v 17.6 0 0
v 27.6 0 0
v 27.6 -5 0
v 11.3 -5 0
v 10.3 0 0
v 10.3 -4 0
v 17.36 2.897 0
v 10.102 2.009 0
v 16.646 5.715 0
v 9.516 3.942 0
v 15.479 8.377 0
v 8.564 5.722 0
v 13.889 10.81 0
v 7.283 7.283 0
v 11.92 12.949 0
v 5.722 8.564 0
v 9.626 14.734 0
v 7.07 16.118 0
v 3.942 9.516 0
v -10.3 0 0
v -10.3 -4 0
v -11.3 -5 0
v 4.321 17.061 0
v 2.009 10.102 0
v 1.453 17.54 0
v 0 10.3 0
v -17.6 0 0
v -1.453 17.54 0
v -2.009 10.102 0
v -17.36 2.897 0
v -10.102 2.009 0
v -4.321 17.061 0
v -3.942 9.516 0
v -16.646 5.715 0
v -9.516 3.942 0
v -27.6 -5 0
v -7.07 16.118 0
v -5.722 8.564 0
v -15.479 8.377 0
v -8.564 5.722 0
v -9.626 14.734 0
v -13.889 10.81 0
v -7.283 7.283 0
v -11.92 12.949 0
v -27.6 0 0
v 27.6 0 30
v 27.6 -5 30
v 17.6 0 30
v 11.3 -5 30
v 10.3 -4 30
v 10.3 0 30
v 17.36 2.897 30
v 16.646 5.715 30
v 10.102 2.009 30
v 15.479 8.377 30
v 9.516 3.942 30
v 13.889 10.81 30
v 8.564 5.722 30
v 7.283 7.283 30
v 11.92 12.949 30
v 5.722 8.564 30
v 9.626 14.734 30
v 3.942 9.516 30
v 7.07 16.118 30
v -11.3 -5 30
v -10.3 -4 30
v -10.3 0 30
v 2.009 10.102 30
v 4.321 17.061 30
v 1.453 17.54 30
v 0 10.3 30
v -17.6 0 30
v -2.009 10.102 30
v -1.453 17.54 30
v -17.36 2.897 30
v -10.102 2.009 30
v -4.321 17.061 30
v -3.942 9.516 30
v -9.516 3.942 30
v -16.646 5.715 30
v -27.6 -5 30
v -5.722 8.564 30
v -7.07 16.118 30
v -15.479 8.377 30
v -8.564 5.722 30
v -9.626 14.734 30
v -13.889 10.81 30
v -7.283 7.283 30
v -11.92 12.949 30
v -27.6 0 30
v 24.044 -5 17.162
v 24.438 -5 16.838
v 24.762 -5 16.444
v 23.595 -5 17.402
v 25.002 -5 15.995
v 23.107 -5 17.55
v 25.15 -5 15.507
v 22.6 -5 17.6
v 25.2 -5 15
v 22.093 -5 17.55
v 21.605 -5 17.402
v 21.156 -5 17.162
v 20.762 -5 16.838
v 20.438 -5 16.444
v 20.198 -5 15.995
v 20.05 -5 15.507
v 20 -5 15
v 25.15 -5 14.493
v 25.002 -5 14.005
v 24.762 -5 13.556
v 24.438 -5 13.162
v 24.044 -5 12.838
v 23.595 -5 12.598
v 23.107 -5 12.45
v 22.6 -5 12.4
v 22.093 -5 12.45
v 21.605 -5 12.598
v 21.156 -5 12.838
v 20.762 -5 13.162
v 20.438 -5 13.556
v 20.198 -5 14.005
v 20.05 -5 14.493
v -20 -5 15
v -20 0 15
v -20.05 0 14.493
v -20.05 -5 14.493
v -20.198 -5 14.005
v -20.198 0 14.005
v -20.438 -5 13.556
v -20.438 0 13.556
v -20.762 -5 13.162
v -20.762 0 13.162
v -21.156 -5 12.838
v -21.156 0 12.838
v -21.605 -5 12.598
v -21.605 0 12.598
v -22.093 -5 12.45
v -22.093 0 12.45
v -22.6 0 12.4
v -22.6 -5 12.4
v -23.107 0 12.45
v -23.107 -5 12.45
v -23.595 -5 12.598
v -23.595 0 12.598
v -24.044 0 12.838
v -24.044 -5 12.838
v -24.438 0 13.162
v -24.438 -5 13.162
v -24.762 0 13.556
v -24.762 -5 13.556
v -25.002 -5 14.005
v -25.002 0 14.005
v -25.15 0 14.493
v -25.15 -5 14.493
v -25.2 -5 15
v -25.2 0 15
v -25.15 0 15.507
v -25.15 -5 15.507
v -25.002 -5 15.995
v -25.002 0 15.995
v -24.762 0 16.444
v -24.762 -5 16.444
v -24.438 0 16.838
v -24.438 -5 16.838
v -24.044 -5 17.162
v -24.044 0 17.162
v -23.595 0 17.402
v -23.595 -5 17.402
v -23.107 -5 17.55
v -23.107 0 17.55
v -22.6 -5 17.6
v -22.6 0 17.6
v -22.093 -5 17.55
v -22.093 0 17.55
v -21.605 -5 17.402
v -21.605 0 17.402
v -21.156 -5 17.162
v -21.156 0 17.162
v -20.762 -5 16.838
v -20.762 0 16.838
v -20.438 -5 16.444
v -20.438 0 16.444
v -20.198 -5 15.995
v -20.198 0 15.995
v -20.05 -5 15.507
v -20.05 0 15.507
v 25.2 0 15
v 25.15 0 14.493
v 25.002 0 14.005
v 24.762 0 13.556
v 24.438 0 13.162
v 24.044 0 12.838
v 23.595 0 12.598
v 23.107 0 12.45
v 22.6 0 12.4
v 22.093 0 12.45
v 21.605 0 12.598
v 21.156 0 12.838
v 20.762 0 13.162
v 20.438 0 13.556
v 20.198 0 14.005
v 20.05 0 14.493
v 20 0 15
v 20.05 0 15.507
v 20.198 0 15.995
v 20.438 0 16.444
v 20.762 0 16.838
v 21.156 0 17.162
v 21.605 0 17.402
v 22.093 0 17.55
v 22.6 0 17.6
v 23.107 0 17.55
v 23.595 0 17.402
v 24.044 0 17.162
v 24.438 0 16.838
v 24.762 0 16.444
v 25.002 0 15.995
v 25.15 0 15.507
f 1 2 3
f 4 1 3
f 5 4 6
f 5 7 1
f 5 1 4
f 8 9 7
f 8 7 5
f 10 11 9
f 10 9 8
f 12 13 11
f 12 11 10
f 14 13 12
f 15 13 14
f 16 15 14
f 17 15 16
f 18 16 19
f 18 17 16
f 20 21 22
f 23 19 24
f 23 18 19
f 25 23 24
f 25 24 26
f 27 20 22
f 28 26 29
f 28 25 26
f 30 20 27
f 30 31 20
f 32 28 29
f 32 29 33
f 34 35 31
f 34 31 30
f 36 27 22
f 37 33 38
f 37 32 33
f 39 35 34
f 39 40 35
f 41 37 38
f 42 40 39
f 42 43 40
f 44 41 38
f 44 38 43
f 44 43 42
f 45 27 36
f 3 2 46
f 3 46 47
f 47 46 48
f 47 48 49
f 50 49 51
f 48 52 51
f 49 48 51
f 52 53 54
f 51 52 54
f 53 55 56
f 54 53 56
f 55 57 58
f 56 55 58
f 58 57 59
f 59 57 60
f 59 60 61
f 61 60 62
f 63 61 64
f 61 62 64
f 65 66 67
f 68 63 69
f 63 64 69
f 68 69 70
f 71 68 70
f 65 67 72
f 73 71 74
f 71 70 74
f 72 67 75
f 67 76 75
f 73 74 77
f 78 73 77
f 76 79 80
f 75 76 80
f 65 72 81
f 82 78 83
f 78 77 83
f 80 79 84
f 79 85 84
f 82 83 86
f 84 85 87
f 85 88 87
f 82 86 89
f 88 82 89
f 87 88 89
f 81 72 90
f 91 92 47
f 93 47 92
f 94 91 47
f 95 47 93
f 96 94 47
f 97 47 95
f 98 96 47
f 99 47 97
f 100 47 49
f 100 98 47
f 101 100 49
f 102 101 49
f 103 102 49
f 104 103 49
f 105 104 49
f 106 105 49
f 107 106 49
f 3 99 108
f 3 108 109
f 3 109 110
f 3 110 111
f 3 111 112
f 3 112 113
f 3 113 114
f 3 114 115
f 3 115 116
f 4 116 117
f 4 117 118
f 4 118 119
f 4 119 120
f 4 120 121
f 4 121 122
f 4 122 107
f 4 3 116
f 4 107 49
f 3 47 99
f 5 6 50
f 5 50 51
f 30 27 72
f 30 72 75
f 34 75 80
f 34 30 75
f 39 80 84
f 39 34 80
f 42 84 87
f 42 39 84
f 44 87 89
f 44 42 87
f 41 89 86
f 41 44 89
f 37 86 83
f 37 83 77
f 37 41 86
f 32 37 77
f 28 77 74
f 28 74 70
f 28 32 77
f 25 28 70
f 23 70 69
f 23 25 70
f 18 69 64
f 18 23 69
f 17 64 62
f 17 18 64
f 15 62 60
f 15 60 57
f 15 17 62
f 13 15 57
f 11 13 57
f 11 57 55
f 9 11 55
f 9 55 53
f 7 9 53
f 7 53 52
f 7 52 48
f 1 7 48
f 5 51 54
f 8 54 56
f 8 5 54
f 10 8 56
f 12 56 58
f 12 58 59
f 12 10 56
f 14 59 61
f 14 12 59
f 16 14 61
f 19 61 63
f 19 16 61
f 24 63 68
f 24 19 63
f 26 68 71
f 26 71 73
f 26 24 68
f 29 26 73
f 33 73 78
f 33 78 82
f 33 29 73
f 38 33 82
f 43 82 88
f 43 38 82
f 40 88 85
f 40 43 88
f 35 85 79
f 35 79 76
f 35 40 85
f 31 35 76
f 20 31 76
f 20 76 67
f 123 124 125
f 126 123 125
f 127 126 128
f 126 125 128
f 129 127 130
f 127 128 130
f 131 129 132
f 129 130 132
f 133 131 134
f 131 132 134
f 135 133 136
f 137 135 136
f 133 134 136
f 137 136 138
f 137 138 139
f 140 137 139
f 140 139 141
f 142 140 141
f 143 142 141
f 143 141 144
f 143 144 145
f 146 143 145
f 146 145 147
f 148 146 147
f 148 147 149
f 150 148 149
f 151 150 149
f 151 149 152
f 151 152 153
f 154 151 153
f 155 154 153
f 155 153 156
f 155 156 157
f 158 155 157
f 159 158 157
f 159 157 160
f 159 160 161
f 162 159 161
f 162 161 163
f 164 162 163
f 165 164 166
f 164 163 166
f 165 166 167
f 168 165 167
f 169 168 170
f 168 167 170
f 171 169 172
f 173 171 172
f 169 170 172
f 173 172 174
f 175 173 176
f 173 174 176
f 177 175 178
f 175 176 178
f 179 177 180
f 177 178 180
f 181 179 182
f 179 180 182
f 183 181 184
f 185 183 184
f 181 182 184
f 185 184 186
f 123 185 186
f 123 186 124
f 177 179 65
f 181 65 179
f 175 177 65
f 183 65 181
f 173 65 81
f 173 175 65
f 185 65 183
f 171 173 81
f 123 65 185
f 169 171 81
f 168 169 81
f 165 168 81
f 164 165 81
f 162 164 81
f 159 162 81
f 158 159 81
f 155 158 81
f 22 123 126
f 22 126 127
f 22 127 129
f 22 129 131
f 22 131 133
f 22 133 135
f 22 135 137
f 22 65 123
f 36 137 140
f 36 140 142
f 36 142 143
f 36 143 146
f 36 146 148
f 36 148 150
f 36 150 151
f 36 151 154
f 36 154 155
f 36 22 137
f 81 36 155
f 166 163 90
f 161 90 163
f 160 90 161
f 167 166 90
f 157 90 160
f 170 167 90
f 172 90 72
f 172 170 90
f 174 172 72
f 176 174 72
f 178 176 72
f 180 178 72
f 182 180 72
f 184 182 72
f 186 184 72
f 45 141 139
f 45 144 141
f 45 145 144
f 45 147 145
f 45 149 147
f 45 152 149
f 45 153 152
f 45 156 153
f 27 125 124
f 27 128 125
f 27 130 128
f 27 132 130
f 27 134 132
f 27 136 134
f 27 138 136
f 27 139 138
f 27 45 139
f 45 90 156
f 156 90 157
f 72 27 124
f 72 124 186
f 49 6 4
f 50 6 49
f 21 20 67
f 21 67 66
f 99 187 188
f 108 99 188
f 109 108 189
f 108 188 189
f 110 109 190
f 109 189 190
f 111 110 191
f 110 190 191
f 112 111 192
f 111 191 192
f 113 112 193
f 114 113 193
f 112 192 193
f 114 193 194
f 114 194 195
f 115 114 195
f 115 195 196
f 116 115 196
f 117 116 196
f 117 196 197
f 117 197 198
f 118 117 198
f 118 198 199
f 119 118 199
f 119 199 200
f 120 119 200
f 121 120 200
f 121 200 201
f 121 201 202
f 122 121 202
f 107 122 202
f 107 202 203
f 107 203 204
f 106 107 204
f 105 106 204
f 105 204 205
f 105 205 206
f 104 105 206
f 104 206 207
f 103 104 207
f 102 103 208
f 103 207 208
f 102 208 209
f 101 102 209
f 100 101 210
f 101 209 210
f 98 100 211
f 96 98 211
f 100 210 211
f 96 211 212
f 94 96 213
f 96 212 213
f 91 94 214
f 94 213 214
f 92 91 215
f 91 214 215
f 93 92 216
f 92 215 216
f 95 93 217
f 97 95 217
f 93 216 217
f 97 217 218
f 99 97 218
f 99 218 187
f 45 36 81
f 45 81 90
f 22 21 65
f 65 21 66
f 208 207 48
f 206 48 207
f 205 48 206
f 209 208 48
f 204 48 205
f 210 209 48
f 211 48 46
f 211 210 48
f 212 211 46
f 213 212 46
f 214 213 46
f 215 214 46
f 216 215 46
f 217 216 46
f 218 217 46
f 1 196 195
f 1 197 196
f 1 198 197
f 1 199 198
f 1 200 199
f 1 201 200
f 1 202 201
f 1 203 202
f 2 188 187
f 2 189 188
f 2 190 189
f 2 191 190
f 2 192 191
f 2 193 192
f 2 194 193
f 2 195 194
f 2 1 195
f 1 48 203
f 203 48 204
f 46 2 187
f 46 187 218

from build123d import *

# Parameters (mm, degrees)
BOSS_EXTRU_1_DEPTH      = 30
ESQUISSE3_R             = 2.6
ENL_V_MAT_EXTRU_1_DEPTH = 6
CHANFREIN1_SIZE         = 1


with BuildPart() as part:
    # Esquisse1 → Boss.-Extru.1 (new body)
    with BuildSketch(Plane.XY):
        with BuildLine():
            Line((-27.6, 0), (-17.6, 0))
            ThreePointArc((-17.6, 0), (0, 17.6), (17.6, 0))
            Line((17.6, 0), (27.6, 0))
            Line((27.6, 0), (27.6, -5))
            Line((27.6, -5), (10.3, -5))
            Line((10.3, -5), (10.3, 0))
            ThreePointArc((10.3, 0), (0, 10.3), (-10.3, 0))
            Line((-10.3, 0), (-10.3, -5))
            Line((-10.3, -5), (-27.6, -5))
            Line((-27.6, -5), (-27.6, 0))
        make_face()
    extrude(amount=BOSS_EXTRU_1_DEPTH)

    # Esquisse3 → Enlèv. mat.-Extru.1 (cut, through all)
    with BuildSketch(Plane(origin=(0, 0, 0), x_dir=(1, 0, 0), z_dir=(0, 1, 0))):
        with Locations((-22.6, -15)):
            Circle(ESQUISSE3_R)
        with Locations((22.6, -15)):
            Circle(ESQUISSE3_R)
    extrude(amount=-ENL_V_MAT_EXTRU_1_DEPTH, mode=Mode.SUBTRACT)

    # Chanfrein1
    chanfrein1_edges = [part.edges().sort_by_distance(p)[0] for p in [
        (-10.3, -5, 15),
        (10.3, -5, 15),
    ]]
    chamfer(chanfrein1_edges, length=CHANFREIN1_SIZE)


solid = part.part
